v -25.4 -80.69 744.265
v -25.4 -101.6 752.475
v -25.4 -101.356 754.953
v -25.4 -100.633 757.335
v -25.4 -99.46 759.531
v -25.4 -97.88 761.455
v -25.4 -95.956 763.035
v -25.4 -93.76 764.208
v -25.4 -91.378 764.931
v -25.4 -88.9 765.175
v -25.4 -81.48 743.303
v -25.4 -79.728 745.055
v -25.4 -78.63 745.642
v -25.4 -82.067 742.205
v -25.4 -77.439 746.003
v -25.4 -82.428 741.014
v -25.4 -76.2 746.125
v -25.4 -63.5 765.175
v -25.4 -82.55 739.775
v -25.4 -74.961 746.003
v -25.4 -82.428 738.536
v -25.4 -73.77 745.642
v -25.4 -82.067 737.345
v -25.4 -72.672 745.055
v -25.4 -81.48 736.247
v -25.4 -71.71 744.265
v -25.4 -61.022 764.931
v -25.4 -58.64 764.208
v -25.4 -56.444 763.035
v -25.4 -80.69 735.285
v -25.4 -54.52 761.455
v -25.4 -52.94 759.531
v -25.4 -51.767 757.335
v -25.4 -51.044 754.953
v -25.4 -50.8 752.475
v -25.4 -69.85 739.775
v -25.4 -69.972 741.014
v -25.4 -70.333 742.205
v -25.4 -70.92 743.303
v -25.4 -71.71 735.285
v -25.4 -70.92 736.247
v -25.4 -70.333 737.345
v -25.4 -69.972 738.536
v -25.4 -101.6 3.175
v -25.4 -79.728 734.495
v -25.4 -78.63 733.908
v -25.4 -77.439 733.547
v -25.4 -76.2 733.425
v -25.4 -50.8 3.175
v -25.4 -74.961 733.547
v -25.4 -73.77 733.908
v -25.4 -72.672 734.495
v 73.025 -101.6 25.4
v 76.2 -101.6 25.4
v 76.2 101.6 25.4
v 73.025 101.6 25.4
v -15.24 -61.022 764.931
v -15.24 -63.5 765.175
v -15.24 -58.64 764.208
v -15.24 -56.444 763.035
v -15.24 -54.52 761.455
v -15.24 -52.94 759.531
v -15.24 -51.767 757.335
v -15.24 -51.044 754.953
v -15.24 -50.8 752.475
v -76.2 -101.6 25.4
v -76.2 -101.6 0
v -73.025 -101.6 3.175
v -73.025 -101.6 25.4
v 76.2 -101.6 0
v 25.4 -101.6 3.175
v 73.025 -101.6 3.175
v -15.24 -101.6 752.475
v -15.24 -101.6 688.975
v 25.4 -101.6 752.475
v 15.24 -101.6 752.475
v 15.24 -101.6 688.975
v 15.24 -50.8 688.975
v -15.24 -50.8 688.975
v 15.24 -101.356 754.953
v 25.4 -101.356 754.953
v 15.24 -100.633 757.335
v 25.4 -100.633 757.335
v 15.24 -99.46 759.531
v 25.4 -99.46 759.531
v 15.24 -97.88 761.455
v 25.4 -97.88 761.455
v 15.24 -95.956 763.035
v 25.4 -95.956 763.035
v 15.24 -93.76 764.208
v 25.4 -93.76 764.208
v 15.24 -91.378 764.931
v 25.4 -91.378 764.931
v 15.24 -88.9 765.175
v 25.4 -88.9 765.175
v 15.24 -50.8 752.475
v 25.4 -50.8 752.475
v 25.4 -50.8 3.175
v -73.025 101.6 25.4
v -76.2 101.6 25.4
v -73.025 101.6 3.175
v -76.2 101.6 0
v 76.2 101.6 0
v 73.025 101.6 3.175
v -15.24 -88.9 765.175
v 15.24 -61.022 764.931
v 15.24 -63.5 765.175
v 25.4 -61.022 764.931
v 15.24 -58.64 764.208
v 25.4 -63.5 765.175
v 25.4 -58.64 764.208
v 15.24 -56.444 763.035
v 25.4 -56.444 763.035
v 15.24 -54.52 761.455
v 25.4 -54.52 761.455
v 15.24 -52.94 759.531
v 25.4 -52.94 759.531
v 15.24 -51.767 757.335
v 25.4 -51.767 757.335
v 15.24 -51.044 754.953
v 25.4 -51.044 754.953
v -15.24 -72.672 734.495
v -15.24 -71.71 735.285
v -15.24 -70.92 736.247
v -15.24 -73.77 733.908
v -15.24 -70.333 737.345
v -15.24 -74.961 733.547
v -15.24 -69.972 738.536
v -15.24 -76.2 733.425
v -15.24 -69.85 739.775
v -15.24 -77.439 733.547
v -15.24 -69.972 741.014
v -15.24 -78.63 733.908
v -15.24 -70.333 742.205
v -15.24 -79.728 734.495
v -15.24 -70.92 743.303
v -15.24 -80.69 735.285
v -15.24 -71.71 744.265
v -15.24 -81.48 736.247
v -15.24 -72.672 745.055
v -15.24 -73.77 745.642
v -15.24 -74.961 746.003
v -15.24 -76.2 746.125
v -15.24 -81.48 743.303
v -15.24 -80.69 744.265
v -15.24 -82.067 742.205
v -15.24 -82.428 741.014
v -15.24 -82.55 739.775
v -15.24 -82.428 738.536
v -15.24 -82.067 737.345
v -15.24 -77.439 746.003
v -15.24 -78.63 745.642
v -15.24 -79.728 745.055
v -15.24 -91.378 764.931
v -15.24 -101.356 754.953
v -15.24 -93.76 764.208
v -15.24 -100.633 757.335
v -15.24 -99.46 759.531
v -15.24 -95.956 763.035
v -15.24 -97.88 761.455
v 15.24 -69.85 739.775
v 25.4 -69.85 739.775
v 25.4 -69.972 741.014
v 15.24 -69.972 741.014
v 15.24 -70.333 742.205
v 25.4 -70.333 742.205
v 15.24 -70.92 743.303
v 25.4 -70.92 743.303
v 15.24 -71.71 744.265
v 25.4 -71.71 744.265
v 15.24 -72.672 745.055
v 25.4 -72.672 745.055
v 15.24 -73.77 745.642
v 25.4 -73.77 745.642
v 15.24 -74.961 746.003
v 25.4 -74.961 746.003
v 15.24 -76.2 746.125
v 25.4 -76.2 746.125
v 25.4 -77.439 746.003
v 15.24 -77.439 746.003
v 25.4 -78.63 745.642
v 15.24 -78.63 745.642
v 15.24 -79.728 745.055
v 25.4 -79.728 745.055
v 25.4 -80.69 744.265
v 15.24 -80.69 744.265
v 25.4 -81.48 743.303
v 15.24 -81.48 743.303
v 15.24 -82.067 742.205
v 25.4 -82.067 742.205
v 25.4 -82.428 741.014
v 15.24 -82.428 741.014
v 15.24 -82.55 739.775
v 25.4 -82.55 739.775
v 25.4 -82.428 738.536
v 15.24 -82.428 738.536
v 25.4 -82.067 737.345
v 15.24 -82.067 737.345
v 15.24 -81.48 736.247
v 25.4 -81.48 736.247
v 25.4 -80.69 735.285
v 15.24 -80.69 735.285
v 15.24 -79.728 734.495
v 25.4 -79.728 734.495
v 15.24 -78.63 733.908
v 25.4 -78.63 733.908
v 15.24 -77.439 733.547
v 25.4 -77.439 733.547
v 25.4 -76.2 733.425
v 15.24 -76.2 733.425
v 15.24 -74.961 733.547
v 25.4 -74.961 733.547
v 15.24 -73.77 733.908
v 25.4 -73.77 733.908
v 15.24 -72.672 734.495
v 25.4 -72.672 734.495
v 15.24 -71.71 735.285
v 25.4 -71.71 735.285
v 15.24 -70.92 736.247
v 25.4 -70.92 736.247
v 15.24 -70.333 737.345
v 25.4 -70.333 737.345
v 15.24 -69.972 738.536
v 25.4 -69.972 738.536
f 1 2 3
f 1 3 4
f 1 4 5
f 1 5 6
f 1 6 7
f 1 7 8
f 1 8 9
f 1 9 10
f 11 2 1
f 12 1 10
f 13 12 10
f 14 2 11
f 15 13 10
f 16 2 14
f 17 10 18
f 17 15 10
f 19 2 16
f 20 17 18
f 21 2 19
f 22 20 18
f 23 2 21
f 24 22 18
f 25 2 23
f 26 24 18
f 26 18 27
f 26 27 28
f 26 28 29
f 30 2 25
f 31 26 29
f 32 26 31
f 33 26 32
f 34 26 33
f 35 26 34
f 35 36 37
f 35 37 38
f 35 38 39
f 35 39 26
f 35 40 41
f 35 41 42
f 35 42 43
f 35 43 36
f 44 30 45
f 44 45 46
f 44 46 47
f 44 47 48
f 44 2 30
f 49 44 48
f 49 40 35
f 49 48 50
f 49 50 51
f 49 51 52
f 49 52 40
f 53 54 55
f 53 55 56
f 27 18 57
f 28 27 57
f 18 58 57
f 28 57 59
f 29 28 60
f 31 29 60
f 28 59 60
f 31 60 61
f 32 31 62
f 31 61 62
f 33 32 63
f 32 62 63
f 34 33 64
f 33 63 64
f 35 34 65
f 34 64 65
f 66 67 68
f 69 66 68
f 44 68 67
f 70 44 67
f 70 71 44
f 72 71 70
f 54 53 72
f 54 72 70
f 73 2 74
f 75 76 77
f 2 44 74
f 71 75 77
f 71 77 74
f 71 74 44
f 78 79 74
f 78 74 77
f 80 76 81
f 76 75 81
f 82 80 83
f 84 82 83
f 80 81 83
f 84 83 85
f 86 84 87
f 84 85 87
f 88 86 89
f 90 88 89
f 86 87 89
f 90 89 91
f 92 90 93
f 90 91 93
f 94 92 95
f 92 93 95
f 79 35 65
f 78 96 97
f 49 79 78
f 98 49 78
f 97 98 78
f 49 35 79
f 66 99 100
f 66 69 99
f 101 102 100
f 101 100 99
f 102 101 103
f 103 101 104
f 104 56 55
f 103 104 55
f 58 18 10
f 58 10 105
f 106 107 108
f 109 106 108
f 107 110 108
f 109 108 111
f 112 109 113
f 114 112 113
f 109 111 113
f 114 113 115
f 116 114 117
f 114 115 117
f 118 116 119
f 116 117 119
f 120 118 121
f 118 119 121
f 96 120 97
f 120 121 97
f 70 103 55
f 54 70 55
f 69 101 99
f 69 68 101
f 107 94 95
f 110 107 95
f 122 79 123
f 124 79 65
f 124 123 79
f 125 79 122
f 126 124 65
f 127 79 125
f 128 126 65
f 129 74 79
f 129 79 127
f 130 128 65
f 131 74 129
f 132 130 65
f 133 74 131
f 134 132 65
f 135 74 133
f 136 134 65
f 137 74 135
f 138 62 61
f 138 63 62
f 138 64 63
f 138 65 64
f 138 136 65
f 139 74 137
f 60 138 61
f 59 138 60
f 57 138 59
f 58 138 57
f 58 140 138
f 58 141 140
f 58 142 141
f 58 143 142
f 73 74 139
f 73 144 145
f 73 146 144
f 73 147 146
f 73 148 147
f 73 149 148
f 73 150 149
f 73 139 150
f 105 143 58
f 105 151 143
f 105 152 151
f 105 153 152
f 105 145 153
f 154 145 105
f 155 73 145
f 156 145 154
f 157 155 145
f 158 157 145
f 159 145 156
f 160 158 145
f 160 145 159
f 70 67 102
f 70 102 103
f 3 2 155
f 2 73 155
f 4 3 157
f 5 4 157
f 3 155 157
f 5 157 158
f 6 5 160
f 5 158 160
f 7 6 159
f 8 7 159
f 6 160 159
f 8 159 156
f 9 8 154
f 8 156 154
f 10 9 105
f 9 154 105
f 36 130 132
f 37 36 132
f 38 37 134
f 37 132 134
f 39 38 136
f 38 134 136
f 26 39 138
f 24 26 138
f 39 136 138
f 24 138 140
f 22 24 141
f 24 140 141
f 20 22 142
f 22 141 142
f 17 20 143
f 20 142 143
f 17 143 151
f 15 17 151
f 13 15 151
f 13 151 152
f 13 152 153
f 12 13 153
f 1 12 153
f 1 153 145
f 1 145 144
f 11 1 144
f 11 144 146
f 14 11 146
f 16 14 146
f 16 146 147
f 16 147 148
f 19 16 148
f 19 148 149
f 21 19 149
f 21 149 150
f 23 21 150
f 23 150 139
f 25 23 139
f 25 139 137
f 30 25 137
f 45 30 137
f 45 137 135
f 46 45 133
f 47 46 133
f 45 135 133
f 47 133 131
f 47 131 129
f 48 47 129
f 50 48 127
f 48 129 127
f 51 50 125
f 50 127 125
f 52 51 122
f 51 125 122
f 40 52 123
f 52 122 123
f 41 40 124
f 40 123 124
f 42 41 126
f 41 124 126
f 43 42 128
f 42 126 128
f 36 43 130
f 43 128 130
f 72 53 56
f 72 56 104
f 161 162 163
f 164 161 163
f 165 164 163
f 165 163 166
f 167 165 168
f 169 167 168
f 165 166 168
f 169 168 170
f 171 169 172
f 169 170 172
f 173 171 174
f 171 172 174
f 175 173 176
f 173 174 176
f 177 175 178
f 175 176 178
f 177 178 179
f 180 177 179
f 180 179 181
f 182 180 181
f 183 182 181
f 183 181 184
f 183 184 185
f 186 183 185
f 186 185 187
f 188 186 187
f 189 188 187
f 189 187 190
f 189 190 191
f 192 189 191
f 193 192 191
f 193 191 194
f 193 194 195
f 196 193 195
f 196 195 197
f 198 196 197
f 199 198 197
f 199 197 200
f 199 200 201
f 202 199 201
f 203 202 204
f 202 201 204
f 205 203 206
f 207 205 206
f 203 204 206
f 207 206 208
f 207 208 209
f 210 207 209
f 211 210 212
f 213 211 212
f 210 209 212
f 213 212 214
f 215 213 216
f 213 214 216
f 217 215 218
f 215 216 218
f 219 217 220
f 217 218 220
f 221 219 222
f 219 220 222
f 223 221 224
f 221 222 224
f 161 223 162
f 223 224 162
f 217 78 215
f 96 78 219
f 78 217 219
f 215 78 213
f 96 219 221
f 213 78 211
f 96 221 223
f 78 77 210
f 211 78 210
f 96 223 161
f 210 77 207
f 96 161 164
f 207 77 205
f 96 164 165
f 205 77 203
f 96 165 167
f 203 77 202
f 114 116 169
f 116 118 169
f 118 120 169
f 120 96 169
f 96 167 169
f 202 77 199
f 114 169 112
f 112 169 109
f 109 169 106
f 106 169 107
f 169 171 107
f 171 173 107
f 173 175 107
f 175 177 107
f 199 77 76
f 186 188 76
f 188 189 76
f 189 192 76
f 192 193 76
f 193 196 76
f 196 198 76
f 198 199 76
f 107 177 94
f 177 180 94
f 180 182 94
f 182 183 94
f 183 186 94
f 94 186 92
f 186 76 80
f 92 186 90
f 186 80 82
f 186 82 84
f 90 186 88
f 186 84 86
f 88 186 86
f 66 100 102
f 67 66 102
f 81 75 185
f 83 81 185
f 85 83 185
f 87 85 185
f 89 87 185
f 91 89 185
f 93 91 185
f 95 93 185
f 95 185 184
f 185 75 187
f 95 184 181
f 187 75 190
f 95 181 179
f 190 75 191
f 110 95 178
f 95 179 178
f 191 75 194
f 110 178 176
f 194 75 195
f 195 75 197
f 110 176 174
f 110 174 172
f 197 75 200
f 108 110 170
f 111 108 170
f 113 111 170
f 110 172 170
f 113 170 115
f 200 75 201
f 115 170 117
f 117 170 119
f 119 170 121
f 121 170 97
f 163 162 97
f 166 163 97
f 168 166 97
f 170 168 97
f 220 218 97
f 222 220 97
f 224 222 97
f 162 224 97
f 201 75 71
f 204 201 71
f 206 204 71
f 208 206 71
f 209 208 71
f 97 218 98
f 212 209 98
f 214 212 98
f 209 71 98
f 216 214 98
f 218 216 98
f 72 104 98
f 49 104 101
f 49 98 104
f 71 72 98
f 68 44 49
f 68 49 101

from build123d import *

# Parameters (mm, degrees)
F1_DEPTH = 101.6
F2_W     = 50.8
F2_H     = 50.8
F3_DEPTH = 762
F4_R     = 6.35
F5_DEPTH = 101.601
F6_W     = 30.48
F6_H     = 76.2
F7_DEPTH = 203.201
F8_R     = 12.7


with BuildPart() as f1:
    # F0 (on Front) → F1 (new body, symmetric)
    with BuildSketch(Plane.XZ):
        Polygon((-73.025, 25.4), (-76.2, 25.4), (-76.2, 0), (76.2, 0), (76.2, 25.4), (73.025, 25.4), (73.025, 3.175), (-73.025, 3.175), align=None)
    extrude(amount=F1_DEPTH, both=True)

    # F2 (on face) → F3 (join)
    with BuildSketch(Plane.XY.offset(3.175)):
        with Locations((0, -76.2)):
            Rectangle(F2_W, F2_H)
    extrude(amount=F3_DEPTH)

    # F4 (on face) → F5 (cut, through all)
    with BuildSketch(Plane.YZ.offset(25.4)):
        with Locations((-76.2, 739.775)):
            Circle(F4_R)
    extrude(amount=-F5_DEPTH, mode=Mode.SUBTRACT)

    # F6 (on face) → F7 (cut, through all)
    with BuildSketch(Plane.XZ.offset(101.6)):
        with Locations((0, 727.075)):
            Rectangle(F6_W, F6_H)
    extrude(amount=-F7_DEPTH, mode=Mode.SUBTRACT)

    # F8
    f8_edges = [f1.edges().sort_by_distance(p)[0] for p in [
        (-20.32, -101.6, 765.175),
        (20.32, -101.6, 765.175),
        (-20.32, -50.8, 765.175),
        (20.32, -50.8, 765.175),
    ]]
    fillet(f8_edges, radius=F8_R)


solid = f1.part
